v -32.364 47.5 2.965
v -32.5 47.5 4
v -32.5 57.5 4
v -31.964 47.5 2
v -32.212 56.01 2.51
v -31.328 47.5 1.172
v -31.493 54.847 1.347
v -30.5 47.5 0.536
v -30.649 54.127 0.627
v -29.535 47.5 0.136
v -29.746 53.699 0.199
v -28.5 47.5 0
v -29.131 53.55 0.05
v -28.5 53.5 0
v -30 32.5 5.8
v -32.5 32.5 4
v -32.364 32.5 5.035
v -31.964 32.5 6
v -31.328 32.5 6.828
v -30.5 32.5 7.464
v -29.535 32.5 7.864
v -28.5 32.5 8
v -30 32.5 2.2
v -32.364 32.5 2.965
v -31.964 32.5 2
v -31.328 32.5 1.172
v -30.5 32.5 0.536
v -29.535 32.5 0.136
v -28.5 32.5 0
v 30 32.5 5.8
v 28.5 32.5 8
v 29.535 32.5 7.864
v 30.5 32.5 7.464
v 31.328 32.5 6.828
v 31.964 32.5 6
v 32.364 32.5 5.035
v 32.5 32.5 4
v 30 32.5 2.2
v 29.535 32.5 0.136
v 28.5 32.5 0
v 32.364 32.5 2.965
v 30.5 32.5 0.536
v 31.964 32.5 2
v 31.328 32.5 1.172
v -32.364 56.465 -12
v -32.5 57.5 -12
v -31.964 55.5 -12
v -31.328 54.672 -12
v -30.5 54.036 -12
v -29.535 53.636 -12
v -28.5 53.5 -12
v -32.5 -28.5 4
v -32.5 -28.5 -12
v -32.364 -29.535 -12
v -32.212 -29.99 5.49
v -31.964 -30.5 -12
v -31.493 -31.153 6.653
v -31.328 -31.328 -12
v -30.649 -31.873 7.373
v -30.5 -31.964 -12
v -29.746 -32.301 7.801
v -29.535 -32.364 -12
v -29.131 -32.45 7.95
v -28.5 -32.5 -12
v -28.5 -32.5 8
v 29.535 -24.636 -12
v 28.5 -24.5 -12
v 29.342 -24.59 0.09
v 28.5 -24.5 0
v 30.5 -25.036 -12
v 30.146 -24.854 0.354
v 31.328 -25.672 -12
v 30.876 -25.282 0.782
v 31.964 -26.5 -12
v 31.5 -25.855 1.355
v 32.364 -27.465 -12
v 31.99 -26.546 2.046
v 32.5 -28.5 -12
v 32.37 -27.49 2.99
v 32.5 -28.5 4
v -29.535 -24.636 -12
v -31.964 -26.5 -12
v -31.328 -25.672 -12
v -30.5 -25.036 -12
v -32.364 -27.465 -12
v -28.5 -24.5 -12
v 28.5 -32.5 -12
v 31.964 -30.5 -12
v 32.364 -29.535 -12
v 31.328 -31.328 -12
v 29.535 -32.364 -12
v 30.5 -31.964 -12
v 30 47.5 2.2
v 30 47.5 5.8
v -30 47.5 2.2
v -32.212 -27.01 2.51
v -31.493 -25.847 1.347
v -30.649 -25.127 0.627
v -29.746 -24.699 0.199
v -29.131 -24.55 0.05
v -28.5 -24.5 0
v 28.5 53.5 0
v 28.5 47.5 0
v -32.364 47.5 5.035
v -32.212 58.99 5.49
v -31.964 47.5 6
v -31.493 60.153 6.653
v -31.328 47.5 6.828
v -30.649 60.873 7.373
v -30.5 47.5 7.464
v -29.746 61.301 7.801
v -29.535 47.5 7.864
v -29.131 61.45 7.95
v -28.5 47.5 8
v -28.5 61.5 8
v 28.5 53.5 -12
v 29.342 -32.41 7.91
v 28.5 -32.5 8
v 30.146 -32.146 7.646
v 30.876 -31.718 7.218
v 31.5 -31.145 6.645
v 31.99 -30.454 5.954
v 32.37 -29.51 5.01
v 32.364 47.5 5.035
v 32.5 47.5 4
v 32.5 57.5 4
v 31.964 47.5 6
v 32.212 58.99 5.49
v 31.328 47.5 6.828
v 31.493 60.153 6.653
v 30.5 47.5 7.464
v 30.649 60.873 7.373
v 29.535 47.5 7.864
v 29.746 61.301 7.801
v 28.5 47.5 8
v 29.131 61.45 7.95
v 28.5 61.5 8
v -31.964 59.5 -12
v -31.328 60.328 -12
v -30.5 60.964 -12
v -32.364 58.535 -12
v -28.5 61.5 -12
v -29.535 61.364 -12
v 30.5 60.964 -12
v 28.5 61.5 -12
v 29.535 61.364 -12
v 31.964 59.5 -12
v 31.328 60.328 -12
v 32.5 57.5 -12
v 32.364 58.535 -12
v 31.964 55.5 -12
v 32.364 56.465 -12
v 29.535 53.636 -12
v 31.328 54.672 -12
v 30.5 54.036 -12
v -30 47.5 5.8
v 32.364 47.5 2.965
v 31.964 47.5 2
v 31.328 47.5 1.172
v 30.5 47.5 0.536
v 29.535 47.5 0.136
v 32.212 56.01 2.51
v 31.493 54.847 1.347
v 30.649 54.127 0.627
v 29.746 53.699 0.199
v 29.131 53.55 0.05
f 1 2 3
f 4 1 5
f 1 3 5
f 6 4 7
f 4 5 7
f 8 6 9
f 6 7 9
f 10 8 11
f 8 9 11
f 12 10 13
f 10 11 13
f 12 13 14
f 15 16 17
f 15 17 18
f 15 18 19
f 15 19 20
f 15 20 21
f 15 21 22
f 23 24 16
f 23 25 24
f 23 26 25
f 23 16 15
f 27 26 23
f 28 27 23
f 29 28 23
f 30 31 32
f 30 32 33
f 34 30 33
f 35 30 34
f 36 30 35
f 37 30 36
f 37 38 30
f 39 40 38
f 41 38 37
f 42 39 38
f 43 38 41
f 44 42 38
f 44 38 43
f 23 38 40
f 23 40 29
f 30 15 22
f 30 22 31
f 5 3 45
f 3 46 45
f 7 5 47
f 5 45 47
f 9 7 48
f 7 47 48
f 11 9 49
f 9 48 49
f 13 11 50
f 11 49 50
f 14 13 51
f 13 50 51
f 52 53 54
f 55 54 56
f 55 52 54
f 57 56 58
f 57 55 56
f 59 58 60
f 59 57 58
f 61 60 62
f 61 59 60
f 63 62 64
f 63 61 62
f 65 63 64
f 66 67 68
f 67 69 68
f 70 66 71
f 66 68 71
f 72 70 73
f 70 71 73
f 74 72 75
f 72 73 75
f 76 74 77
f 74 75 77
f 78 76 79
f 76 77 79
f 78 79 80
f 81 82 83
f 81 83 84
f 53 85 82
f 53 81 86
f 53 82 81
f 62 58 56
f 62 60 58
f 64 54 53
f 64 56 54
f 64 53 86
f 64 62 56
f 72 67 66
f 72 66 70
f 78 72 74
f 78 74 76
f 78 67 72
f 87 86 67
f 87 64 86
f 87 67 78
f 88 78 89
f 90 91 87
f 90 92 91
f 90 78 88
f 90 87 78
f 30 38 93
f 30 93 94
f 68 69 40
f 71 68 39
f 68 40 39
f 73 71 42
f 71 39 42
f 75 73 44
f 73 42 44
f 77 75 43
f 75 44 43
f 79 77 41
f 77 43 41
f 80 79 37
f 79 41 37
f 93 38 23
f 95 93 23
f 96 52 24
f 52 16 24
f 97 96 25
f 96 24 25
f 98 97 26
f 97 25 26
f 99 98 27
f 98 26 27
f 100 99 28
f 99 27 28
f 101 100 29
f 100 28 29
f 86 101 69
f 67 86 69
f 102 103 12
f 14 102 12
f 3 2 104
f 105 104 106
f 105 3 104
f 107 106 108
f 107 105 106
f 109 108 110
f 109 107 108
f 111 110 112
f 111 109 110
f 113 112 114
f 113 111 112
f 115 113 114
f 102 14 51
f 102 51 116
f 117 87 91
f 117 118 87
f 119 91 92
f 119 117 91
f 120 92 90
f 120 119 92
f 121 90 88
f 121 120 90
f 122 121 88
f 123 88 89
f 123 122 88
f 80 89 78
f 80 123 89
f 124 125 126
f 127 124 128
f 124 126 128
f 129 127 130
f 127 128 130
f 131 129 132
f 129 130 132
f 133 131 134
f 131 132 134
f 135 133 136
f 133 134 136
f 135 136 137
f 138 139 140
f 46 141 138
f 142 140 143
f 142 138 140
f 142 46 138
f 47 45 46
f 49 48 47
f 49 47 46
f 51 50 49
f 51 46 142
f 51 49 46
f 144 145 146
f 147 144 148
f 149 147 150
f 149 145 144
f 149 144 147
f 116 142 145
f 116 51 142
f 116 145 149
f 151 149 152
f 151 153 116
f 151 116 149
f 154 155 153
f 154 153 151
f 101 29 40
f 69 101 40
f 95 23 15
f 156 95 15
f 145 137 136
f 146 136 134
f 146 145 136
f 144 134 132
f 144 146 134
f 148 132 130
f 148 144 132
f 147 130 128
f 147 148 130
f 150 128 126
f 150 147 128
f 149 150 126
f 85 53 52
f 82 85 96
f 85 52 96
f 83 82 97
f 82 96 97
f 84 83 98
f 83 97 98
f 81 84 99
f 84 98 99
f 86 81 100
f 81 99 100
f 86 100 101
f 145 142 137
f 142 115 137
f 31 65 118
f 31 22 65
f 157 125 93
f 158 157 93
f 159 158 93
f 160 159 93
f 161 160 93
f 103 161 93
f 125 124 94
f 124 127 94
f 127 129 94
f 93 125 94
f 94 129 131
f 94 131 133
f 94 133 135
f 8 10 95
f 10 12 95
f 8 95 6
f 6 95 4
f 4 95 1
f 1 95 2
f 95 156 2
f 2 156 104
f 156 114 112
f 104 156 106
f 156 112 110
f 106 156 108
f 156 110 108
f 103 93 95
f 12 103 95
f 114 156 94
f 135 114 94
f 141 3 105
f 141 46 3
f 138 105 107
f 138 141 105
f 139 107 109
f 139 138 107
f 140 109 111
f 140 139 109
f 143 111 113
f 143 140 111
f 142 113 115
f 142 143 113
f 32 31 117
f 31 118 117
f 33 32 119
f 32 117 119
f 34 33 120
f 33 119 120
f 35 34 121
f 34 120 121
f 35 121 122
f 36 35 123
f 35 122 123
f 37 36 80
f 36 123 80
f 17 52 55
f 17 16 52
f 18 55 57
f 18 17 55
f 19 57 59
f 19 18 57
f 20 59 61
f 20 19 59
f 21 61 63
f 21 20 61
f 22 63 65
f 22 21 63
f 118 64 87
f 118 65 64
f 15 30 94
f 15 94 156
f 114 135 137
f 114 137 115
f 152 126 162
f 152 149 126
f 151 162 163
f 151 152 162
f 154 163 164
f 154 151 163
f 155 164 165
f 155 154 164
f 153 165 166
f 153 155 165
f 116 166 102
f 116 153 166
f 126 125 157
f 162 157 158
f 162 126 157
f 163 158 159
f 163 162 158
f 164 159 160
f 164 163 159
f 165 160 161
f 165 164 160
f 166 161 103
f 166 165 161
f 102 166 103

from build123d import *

# Parameters (mm, degrees)
F0_W      = 65
F0_H      = 65
F1_DEPTH  = 8
F2_W      = 65
F2_H      = 20
F3_DEPTH  = 8
F4_W      = 60
F4_H      = 3.6
F5_DEPTH  = 15
F6_R      = 3.99999
F7_W      = 65
F7_H      = 8
F8_DEPTH  = 14
F9_W      = 65
F9_H      = 8
F10_DEPTH = 12
F11_R     = 3.99999


# Not quite as in the source:
# - a fillet or chamfer is up to 0.001 mm smaller than in the source, because OpenCascade refuses the exact size


with BuildPart() as f1:
    # F0 (on Top) → F1 (new body)
    with BuildSketch(Plane.XY):
        Rectangle(F0_W, F0_H)
    extrude(amount=F1_DEPTH)

    # F2 (on face) → F3 (join)
    with BuildSketch(Plane.XZ.offset(32.5)):
        with Locations((0, -2)):
            Rectangle(F2_W, F2_H)
    extrude(amount=-F3_DEPTH)

    # F4 (on face) → F5 (join)
    with BuildSketch(Plane(origin=(0, 32.5, 0), x_dir=(-1, 0, 0), z_dir=(0, 1, 0))):
        with Locations((0, 4)):
            Rectangle(F4_W, F4_H)
    extrude(amount=F5_DEPTH)

    # F6 (radius 4 in the source; OpenCascade refuses exactly that, so slightly less here)
    f6_edges = [f1.edges().sort_by_distance(p)[0] for p in [
        (-32.5, -24.5, -6),
        (-32.5, -32.5, -2),
        (32.5, -24.5, -6),
        (32.5, -32.5, -2),
        (32.5, 0, 8),
        (-32.5, 0, 8),
        (32.5, 4, 0),
        (-32.5, 4, 0),
    ]]
    fillet(f6_edges, radius=F6_R)

    # F7 (on face) → F8 (join)
    with BuildSketch(Plane(origin=(0, 47.5, 0), x_dir=(-1, 0, 0), z_dir=(0, 1, 0))):
        with Locations((0, 4)):
            Rectangle(F7_W, F7_H)
    extrude(amount=F8_DEPTH)

    # F9 (on face) → F10 (join, through all)
    with BuildSketch(Plane(origin=(0, 0, 0), x_dir=(1, 0, 0), z_dir=(0, 0, -1))):
        with Locations((0, -57.5)):
            Rectangle(F9_W, F9_H)
    extrude(amount=F10_DEPTH)

    # F11 (radius 4 in the source; OpenCascade refuses exactly that, so slightly less here)
    f11_edges = [f1.edges().sort_by_distance(p)[0] for p in [
        (-32.5, 61.5, -2),
        (-32.5, 53.5, -6),
        (-32.5, 50.5, 0),
        (-32.5, 54.5, 8),
        (32.5, 50.5, 0),
        (32.5, 54.5, 8),
        (32.5, 61.5, -2),
        (32.5, 53.5, -6),
    ]]
    fillet(f11_edges, radius=F11_R)


solid = f1.part
